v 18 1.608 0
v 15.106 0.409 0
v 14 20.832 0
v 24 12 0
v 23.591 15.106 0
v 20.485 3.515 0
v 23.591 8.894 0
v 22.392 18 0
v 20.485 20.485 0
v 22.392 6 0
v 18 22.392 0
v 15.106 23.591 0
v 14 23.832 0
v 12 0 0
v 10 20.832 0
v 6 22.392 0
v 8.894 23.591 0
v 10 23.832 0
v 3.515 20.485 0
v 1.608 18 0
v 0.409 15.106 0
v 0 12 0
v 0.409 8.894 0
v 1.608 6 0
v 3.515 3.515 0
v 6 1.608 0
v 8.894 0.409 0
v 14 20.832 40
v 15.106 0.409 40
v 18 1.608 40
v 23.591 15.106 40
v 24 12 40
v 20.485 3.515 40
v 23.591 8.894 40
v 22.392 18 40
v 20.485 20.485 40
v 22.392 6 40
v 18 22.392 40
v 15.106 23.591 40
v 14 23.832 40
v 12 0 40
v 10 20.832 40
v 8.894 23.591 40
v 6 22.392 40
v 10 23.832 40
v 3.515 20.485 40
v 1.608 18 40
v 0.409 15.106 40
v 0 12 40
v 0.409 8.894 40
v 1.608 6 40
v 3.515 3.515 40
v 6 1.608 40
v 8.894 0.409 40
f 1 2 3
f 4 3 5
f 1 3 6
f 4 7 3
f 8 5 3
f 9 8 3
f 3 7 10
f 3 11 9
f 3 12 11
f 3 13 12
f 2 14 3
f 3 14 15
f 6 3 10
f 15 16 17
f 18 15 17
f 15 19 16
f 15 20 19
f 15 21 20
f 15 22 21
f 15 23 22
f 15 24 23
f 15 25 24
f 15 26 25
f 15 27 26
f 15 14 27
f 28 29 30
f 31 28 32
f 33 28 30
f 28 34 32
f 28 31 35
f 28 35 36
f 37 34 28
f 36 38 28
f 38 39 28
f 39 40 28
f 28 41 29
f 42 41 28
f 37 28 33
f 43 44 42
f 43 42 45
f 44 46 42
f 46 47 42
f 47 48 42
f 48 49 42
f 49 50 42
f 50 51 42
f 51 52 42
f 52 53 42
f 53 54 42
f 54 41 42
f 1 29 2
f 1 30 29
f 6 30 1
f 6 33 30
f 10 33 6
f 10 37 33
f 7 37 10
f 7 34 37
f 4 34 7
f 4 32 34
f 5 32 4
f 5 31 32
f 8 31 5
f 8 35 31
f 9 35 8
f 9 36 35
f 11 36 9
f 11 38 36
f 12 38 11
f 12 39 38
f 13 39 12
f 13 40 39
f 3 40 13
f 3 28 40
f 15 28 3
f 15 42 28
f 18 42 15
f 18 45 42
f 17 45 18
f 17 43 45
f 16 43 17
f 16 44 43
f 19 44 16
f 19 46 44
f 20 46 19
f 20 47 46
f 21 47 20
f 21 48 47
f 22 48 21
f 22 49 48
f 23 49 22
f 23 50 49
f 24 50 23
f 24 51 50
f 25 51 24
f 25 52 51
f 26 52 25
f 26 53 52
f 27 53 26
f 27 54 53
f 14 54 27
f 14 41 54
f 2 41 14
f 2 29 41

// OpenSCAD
$fn = 32;

// ----------------------------------------------------------------------
// Keyway shaft: d24 shaft, key 4 x 3 mm
// ----------------------------------------------------------------------

// --- parameters (mm) ---
shaft_r = 12;             // shaft radius
key_w = 4;                // keyway width
key_d = 3;                // keyway depth below the surface line
plate_t = 40;             // shaft length, Z (extrusion height)
fit_tol = 0.02;           // declared fit tolerance (prompt contract)
free_tol = 0.2;           // declared free tolerance (prompt contract)

shaft_d = 2 * shaft_r;  // shaft diameter
circle_step = 15;  // polygon sampling step, degrees

profile = [[8.894, 23.591], [6, 22.392], [3.515, 20.485], [1.608, 18], [0.409, 15.106], [0, 12], [0.409, 8.894], [1.608, 6], [3.515, 3.515], [6, 1.608], [8.894, 0.409], [12, 0], [15.106, 0.409], [18, 1.608], [20.485, 3.515], [22.392, 6], [23.591, 8.894], [24, 12], [23.591, 15.106], [22.392, 18], [20.485, 20.485], [18, 22.392], [15.106, 23.591], [14, 23.832], [14, 20.832], [10, 20.832], [10, 23.832]];  // primary outline, 27 points, counter clockwise

// --- the one profile operation ---
linear_extrude(height = plate_t) polygon(points = profile);
